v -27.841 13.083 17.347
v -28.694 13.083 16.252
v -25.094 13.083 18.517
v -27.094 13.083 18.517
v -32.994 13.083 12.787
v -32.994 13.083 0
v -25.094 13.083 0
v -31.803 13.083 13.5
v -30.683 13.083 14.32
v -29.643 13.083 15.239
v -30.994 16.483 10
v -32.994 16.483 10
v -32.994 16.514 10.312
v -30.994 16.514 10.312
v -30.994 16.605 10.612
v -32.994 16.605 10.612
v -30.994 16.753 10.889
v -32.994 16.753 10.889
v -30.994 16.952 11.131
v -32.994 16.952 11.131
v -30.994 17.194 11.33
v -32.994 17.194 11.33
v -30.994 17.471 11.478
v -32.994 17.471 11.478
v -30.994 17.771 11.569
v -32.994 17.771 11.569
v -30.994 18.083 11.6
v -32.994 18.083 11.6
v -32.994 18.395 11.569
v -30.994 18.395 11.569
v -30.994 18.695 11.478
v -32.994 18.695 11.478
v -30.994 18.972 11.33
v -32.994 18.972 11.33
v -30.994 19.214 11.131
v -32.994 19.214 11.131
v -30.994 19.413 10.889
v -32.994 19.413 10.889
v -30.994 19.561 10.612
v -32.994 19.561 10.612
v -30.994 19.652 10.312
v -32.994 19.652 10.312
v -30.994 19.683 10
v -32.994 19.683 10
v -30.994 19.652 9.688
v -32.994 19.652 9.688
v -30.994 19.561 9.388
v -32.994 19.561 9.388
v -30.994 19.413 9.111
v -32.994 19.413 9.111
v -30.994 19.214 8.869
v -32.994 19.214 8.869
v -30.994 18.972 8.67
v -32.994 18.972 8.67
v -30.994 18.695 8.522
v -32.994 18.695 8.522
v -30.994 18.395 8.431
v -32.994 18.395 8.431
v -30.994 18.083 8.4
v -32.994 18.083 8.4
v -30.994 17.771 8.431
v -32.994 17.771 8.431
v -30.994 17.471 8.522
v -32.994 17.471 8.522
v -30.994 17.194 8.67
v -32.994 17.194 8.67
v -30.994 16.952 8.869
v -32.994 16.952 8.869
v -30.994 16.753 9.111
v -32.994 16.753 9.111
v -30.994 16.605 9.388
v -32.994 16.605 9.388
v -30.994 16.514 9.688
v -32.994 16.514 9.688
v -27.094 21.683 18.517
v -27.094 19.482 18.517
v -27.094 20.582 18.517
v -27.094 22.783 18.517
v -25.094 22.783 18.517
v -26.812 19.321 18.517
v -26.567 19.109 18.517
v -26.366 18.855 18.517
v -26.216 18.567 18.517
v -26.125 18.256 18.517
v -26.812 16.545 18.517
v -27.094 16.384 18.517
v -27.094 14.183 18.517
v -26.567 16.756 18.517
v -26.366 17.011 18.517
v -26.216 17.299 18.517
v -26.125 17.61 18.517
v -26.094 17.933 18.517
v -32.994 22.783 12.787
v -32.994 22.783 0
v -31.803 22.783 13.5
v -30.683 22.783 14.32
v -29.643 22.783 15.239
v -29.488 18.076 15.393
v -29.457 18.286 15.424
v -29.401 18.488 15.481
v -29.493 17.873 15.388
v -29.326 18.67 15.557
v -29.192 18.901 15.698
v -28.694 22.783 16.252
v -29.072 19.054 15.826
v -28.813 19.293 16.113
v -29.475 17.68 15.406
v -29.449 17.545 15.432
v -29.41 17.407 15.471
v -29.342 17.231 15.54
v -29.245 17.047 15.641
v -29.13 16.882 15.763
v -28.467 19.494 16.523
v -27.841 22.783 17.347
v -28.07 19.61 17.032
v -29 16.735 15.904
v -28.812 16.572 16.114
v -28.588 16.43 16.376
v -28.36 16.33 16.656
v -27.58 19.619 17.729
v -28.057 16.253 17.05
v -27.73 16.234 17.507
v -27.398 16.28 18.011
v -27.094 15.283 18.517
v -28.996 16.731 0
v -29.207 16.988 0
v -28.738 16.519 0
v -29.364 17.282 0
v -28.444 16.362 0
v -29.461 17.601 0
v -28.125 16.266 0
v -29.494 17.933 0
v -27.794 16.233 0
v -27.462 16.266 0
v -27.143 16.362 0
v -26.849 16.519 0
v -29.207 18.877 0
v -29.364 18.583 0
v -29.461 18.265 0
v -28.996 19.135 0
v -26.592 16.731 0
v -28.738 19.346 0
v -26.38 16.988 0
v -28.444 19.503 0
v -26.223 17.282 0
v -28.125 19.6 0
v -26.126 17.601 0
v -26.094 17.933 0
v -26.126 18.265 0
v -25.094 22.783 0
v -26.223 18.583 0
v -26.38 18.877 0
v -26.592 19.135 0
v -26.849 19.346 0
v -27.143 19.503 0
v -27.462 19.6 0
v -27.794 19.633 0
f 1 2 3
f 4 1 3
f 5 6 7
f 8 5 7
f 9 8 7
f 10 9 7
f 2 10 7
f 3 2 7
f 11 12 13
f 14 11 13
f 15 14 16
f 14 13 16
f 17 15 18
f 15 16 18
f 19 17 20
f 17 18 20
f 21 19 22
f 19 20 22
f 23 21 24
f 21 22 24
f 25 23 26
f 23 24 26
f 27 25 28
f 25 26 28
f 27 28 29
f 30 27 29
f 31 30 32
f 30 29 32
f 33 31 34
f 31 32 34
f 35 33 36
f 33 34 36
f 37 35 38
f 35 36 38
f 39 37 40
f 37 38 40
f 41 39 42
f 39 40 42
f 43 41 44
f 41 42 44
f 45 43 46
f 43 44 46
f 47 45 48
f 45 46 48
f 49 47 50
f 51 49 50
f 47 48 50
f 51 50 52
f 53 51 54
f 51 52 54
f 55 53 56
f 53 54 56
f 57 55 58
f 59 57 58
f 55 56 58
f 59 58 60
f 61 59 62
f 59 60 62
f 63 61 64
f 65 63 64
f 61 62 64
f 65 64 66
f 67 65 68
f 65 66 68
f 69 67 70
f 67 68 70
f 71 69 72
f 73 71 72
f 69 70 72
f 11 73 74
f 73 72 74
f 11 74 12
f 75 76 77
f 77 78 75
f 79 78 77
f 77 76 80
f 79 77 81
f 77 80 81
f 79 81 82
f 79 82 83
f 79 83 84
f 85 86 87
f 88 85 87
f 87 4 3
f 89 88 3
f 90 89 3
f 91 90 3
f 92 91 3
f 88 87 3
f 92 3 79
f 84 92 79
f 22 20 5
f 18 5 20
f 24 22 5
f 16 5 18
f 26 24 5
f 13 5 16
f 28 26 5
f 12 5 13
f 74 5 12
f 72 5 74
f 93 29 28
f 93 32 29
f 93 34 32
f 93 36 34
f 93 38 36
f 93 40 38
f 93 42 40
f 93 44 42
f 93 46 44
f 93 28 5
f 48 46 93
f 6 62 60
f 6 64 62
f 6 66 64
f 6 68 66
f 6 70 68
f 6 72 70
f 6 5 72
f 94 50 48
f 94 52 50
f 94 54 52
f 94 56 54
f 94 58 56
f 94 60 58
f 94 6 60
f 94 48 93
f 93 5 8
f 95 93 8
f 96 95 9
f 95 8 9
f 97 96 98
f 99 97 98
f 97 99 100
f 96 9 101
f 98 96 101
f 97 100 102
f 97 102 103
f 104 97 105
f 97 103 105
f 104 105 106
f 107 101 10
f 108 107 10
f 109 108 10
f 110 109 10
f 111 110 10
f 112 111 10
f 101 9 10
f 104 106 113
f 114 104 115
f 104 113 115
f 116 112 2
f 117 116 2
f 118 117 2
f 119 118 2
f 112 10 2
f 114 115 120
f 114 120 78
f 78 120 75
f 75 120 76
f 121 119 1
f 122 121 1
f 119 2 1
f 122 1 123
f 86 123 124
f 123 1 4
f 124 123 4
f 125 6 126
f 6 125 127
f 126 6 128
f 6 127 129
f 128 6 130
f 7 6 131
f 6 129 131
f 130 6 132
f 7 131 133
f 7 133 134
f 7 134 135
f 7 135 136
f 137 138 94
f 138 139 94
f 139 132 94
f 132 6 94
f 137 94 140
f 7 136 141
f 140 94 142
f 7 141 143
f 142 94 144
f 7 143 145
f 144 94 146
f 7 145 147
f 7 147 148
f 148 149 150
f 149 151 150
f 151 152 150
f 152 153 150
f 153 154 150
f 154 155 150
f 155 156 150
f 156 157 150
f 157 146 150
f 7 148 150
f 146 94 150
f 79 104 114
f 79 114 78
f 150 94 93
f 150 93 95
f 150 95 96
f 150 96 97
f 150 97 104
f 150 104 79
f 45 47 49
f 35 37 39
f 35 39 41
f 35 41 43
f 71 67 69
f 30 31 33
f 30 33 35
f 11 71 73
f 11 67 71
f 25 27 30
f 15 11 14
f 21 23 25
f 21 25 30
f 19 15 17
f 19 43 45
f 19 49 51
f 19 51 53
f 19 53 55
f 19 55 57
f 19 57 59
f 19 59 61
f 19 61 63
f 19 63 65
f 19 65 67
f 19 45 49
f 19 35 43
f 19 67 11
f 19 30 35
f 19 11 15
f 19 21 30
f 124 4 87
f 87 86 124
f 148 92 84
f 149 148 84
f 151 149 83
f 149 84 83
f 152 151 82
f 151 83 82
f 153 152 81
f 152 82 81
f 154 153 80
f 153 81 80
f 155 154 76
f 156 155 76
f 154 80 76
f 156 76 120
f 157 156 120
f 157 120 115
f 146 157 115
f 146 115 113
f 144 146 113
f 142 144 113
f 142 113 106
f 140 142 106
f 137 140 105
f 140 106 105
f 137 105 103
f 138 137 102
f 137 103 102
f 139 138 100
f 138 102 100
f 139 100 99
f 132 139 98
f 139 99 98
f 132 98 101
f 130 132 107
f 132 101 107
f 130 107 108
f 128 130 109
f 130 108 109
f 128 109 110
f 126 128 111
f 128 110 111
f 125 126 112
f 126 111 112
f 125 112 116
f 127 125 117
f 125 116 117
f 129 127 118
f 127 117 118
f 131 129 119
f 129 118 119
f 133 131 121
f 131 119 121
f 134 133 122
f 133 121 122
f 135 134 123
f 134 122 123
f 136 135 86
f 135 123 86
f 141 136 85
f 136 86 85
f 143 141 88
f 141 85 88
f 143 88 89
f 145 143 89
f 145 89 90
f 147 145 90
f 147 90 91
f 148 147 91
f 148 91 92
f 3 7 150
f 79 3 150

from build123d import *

# Parameters (mm, degrees)
SKETCH_W        = 7.9
SKETCH_H        = 9.7
PAD_DEPTH       = 26
SKETCH002_R     = 1.7
POCKET001_DEPTH = 26
SKETCH003_R     = 4
SKETCH003_R_2   = 15
POCKET002_DEPTH = 10
SKETCH004_R     = 1.7
POCKET003_DEPTH = 2
SKETCH005_W     = 2
SKETCH005_H     = 7.483315
POCKET_DEPTH    = 10
SKETCH006_R     = 1.6
POCKET004_DEPTH = 2


with BuildPart() as part:
    # Sketch → Pad (new body)
    with BuildSketch(Plane.XY):
        with Locations((-29.043821, 17.932895)):
            Rectangle(SKETCH_W, SKETCH_H)
    extrude(amount=PAD_DEPTH)

    # Sketch002 → Pocket001 (cut)
    with BuildSketch(Plane.XY.offset(26)):
        with Locations((-27.793821, 17.932895)):
            Circle(SKETCH002_R)
    extrude(amount=-POCKET001_DEPTH, mode=Mode.SUBTRACT)

    # Sketch003 → Pocket002 (cut)
    with BuildSketch(Plane.XZ.offset(-13.082895)):
        with Locations((-19.856678, 26)):
            Circle(SKETCH003_R)
        with Locations((-40.093821, 26)):
            Circle(SKETCH003_R_2)
    extrude(amount=-POCKET002_DEPTH, mode=Mode.SUBTRACT)

    # Sketch004 → Pocket003 (cut)
    with BuildSketch(Plane(origin=(0, 22.782895, 0), x_dir=(-1, 0, 0), z_dir=(0, 1, 0))):
        with Locations((-19.682895, 11)):
            Circle(SKETCH004_R)
    extrude(amount=-POCKET003_DEPTH, mode=Mode.SUBTRACT)

    # Sketch005 → Pocket (cut)
    with BuildSketch(Plane.XZ.offset(-13.082895)):
        with Locations((-26.093821, 22.258342)):
            Rectangle(SKETCH005_W, SKETCH005_H)
    extrude(amount=-POCKET_DEPTH, mode=Mode.SUBTRACT)

    # Sketch006 → Pocket004 (cut)
    with BuildSketch(Plane(origin=(-32.993821, 0, 0), x_dir=(0, -1, 0), z_dir=(-1, 0, 0))):
        with Locations((-18.082895, 10)):
            Circle(SKETCH006_R)
    extrude(amount=-POCKET004_DEPTH, mode=Mode.SUBTRACT)


solid = part.part
